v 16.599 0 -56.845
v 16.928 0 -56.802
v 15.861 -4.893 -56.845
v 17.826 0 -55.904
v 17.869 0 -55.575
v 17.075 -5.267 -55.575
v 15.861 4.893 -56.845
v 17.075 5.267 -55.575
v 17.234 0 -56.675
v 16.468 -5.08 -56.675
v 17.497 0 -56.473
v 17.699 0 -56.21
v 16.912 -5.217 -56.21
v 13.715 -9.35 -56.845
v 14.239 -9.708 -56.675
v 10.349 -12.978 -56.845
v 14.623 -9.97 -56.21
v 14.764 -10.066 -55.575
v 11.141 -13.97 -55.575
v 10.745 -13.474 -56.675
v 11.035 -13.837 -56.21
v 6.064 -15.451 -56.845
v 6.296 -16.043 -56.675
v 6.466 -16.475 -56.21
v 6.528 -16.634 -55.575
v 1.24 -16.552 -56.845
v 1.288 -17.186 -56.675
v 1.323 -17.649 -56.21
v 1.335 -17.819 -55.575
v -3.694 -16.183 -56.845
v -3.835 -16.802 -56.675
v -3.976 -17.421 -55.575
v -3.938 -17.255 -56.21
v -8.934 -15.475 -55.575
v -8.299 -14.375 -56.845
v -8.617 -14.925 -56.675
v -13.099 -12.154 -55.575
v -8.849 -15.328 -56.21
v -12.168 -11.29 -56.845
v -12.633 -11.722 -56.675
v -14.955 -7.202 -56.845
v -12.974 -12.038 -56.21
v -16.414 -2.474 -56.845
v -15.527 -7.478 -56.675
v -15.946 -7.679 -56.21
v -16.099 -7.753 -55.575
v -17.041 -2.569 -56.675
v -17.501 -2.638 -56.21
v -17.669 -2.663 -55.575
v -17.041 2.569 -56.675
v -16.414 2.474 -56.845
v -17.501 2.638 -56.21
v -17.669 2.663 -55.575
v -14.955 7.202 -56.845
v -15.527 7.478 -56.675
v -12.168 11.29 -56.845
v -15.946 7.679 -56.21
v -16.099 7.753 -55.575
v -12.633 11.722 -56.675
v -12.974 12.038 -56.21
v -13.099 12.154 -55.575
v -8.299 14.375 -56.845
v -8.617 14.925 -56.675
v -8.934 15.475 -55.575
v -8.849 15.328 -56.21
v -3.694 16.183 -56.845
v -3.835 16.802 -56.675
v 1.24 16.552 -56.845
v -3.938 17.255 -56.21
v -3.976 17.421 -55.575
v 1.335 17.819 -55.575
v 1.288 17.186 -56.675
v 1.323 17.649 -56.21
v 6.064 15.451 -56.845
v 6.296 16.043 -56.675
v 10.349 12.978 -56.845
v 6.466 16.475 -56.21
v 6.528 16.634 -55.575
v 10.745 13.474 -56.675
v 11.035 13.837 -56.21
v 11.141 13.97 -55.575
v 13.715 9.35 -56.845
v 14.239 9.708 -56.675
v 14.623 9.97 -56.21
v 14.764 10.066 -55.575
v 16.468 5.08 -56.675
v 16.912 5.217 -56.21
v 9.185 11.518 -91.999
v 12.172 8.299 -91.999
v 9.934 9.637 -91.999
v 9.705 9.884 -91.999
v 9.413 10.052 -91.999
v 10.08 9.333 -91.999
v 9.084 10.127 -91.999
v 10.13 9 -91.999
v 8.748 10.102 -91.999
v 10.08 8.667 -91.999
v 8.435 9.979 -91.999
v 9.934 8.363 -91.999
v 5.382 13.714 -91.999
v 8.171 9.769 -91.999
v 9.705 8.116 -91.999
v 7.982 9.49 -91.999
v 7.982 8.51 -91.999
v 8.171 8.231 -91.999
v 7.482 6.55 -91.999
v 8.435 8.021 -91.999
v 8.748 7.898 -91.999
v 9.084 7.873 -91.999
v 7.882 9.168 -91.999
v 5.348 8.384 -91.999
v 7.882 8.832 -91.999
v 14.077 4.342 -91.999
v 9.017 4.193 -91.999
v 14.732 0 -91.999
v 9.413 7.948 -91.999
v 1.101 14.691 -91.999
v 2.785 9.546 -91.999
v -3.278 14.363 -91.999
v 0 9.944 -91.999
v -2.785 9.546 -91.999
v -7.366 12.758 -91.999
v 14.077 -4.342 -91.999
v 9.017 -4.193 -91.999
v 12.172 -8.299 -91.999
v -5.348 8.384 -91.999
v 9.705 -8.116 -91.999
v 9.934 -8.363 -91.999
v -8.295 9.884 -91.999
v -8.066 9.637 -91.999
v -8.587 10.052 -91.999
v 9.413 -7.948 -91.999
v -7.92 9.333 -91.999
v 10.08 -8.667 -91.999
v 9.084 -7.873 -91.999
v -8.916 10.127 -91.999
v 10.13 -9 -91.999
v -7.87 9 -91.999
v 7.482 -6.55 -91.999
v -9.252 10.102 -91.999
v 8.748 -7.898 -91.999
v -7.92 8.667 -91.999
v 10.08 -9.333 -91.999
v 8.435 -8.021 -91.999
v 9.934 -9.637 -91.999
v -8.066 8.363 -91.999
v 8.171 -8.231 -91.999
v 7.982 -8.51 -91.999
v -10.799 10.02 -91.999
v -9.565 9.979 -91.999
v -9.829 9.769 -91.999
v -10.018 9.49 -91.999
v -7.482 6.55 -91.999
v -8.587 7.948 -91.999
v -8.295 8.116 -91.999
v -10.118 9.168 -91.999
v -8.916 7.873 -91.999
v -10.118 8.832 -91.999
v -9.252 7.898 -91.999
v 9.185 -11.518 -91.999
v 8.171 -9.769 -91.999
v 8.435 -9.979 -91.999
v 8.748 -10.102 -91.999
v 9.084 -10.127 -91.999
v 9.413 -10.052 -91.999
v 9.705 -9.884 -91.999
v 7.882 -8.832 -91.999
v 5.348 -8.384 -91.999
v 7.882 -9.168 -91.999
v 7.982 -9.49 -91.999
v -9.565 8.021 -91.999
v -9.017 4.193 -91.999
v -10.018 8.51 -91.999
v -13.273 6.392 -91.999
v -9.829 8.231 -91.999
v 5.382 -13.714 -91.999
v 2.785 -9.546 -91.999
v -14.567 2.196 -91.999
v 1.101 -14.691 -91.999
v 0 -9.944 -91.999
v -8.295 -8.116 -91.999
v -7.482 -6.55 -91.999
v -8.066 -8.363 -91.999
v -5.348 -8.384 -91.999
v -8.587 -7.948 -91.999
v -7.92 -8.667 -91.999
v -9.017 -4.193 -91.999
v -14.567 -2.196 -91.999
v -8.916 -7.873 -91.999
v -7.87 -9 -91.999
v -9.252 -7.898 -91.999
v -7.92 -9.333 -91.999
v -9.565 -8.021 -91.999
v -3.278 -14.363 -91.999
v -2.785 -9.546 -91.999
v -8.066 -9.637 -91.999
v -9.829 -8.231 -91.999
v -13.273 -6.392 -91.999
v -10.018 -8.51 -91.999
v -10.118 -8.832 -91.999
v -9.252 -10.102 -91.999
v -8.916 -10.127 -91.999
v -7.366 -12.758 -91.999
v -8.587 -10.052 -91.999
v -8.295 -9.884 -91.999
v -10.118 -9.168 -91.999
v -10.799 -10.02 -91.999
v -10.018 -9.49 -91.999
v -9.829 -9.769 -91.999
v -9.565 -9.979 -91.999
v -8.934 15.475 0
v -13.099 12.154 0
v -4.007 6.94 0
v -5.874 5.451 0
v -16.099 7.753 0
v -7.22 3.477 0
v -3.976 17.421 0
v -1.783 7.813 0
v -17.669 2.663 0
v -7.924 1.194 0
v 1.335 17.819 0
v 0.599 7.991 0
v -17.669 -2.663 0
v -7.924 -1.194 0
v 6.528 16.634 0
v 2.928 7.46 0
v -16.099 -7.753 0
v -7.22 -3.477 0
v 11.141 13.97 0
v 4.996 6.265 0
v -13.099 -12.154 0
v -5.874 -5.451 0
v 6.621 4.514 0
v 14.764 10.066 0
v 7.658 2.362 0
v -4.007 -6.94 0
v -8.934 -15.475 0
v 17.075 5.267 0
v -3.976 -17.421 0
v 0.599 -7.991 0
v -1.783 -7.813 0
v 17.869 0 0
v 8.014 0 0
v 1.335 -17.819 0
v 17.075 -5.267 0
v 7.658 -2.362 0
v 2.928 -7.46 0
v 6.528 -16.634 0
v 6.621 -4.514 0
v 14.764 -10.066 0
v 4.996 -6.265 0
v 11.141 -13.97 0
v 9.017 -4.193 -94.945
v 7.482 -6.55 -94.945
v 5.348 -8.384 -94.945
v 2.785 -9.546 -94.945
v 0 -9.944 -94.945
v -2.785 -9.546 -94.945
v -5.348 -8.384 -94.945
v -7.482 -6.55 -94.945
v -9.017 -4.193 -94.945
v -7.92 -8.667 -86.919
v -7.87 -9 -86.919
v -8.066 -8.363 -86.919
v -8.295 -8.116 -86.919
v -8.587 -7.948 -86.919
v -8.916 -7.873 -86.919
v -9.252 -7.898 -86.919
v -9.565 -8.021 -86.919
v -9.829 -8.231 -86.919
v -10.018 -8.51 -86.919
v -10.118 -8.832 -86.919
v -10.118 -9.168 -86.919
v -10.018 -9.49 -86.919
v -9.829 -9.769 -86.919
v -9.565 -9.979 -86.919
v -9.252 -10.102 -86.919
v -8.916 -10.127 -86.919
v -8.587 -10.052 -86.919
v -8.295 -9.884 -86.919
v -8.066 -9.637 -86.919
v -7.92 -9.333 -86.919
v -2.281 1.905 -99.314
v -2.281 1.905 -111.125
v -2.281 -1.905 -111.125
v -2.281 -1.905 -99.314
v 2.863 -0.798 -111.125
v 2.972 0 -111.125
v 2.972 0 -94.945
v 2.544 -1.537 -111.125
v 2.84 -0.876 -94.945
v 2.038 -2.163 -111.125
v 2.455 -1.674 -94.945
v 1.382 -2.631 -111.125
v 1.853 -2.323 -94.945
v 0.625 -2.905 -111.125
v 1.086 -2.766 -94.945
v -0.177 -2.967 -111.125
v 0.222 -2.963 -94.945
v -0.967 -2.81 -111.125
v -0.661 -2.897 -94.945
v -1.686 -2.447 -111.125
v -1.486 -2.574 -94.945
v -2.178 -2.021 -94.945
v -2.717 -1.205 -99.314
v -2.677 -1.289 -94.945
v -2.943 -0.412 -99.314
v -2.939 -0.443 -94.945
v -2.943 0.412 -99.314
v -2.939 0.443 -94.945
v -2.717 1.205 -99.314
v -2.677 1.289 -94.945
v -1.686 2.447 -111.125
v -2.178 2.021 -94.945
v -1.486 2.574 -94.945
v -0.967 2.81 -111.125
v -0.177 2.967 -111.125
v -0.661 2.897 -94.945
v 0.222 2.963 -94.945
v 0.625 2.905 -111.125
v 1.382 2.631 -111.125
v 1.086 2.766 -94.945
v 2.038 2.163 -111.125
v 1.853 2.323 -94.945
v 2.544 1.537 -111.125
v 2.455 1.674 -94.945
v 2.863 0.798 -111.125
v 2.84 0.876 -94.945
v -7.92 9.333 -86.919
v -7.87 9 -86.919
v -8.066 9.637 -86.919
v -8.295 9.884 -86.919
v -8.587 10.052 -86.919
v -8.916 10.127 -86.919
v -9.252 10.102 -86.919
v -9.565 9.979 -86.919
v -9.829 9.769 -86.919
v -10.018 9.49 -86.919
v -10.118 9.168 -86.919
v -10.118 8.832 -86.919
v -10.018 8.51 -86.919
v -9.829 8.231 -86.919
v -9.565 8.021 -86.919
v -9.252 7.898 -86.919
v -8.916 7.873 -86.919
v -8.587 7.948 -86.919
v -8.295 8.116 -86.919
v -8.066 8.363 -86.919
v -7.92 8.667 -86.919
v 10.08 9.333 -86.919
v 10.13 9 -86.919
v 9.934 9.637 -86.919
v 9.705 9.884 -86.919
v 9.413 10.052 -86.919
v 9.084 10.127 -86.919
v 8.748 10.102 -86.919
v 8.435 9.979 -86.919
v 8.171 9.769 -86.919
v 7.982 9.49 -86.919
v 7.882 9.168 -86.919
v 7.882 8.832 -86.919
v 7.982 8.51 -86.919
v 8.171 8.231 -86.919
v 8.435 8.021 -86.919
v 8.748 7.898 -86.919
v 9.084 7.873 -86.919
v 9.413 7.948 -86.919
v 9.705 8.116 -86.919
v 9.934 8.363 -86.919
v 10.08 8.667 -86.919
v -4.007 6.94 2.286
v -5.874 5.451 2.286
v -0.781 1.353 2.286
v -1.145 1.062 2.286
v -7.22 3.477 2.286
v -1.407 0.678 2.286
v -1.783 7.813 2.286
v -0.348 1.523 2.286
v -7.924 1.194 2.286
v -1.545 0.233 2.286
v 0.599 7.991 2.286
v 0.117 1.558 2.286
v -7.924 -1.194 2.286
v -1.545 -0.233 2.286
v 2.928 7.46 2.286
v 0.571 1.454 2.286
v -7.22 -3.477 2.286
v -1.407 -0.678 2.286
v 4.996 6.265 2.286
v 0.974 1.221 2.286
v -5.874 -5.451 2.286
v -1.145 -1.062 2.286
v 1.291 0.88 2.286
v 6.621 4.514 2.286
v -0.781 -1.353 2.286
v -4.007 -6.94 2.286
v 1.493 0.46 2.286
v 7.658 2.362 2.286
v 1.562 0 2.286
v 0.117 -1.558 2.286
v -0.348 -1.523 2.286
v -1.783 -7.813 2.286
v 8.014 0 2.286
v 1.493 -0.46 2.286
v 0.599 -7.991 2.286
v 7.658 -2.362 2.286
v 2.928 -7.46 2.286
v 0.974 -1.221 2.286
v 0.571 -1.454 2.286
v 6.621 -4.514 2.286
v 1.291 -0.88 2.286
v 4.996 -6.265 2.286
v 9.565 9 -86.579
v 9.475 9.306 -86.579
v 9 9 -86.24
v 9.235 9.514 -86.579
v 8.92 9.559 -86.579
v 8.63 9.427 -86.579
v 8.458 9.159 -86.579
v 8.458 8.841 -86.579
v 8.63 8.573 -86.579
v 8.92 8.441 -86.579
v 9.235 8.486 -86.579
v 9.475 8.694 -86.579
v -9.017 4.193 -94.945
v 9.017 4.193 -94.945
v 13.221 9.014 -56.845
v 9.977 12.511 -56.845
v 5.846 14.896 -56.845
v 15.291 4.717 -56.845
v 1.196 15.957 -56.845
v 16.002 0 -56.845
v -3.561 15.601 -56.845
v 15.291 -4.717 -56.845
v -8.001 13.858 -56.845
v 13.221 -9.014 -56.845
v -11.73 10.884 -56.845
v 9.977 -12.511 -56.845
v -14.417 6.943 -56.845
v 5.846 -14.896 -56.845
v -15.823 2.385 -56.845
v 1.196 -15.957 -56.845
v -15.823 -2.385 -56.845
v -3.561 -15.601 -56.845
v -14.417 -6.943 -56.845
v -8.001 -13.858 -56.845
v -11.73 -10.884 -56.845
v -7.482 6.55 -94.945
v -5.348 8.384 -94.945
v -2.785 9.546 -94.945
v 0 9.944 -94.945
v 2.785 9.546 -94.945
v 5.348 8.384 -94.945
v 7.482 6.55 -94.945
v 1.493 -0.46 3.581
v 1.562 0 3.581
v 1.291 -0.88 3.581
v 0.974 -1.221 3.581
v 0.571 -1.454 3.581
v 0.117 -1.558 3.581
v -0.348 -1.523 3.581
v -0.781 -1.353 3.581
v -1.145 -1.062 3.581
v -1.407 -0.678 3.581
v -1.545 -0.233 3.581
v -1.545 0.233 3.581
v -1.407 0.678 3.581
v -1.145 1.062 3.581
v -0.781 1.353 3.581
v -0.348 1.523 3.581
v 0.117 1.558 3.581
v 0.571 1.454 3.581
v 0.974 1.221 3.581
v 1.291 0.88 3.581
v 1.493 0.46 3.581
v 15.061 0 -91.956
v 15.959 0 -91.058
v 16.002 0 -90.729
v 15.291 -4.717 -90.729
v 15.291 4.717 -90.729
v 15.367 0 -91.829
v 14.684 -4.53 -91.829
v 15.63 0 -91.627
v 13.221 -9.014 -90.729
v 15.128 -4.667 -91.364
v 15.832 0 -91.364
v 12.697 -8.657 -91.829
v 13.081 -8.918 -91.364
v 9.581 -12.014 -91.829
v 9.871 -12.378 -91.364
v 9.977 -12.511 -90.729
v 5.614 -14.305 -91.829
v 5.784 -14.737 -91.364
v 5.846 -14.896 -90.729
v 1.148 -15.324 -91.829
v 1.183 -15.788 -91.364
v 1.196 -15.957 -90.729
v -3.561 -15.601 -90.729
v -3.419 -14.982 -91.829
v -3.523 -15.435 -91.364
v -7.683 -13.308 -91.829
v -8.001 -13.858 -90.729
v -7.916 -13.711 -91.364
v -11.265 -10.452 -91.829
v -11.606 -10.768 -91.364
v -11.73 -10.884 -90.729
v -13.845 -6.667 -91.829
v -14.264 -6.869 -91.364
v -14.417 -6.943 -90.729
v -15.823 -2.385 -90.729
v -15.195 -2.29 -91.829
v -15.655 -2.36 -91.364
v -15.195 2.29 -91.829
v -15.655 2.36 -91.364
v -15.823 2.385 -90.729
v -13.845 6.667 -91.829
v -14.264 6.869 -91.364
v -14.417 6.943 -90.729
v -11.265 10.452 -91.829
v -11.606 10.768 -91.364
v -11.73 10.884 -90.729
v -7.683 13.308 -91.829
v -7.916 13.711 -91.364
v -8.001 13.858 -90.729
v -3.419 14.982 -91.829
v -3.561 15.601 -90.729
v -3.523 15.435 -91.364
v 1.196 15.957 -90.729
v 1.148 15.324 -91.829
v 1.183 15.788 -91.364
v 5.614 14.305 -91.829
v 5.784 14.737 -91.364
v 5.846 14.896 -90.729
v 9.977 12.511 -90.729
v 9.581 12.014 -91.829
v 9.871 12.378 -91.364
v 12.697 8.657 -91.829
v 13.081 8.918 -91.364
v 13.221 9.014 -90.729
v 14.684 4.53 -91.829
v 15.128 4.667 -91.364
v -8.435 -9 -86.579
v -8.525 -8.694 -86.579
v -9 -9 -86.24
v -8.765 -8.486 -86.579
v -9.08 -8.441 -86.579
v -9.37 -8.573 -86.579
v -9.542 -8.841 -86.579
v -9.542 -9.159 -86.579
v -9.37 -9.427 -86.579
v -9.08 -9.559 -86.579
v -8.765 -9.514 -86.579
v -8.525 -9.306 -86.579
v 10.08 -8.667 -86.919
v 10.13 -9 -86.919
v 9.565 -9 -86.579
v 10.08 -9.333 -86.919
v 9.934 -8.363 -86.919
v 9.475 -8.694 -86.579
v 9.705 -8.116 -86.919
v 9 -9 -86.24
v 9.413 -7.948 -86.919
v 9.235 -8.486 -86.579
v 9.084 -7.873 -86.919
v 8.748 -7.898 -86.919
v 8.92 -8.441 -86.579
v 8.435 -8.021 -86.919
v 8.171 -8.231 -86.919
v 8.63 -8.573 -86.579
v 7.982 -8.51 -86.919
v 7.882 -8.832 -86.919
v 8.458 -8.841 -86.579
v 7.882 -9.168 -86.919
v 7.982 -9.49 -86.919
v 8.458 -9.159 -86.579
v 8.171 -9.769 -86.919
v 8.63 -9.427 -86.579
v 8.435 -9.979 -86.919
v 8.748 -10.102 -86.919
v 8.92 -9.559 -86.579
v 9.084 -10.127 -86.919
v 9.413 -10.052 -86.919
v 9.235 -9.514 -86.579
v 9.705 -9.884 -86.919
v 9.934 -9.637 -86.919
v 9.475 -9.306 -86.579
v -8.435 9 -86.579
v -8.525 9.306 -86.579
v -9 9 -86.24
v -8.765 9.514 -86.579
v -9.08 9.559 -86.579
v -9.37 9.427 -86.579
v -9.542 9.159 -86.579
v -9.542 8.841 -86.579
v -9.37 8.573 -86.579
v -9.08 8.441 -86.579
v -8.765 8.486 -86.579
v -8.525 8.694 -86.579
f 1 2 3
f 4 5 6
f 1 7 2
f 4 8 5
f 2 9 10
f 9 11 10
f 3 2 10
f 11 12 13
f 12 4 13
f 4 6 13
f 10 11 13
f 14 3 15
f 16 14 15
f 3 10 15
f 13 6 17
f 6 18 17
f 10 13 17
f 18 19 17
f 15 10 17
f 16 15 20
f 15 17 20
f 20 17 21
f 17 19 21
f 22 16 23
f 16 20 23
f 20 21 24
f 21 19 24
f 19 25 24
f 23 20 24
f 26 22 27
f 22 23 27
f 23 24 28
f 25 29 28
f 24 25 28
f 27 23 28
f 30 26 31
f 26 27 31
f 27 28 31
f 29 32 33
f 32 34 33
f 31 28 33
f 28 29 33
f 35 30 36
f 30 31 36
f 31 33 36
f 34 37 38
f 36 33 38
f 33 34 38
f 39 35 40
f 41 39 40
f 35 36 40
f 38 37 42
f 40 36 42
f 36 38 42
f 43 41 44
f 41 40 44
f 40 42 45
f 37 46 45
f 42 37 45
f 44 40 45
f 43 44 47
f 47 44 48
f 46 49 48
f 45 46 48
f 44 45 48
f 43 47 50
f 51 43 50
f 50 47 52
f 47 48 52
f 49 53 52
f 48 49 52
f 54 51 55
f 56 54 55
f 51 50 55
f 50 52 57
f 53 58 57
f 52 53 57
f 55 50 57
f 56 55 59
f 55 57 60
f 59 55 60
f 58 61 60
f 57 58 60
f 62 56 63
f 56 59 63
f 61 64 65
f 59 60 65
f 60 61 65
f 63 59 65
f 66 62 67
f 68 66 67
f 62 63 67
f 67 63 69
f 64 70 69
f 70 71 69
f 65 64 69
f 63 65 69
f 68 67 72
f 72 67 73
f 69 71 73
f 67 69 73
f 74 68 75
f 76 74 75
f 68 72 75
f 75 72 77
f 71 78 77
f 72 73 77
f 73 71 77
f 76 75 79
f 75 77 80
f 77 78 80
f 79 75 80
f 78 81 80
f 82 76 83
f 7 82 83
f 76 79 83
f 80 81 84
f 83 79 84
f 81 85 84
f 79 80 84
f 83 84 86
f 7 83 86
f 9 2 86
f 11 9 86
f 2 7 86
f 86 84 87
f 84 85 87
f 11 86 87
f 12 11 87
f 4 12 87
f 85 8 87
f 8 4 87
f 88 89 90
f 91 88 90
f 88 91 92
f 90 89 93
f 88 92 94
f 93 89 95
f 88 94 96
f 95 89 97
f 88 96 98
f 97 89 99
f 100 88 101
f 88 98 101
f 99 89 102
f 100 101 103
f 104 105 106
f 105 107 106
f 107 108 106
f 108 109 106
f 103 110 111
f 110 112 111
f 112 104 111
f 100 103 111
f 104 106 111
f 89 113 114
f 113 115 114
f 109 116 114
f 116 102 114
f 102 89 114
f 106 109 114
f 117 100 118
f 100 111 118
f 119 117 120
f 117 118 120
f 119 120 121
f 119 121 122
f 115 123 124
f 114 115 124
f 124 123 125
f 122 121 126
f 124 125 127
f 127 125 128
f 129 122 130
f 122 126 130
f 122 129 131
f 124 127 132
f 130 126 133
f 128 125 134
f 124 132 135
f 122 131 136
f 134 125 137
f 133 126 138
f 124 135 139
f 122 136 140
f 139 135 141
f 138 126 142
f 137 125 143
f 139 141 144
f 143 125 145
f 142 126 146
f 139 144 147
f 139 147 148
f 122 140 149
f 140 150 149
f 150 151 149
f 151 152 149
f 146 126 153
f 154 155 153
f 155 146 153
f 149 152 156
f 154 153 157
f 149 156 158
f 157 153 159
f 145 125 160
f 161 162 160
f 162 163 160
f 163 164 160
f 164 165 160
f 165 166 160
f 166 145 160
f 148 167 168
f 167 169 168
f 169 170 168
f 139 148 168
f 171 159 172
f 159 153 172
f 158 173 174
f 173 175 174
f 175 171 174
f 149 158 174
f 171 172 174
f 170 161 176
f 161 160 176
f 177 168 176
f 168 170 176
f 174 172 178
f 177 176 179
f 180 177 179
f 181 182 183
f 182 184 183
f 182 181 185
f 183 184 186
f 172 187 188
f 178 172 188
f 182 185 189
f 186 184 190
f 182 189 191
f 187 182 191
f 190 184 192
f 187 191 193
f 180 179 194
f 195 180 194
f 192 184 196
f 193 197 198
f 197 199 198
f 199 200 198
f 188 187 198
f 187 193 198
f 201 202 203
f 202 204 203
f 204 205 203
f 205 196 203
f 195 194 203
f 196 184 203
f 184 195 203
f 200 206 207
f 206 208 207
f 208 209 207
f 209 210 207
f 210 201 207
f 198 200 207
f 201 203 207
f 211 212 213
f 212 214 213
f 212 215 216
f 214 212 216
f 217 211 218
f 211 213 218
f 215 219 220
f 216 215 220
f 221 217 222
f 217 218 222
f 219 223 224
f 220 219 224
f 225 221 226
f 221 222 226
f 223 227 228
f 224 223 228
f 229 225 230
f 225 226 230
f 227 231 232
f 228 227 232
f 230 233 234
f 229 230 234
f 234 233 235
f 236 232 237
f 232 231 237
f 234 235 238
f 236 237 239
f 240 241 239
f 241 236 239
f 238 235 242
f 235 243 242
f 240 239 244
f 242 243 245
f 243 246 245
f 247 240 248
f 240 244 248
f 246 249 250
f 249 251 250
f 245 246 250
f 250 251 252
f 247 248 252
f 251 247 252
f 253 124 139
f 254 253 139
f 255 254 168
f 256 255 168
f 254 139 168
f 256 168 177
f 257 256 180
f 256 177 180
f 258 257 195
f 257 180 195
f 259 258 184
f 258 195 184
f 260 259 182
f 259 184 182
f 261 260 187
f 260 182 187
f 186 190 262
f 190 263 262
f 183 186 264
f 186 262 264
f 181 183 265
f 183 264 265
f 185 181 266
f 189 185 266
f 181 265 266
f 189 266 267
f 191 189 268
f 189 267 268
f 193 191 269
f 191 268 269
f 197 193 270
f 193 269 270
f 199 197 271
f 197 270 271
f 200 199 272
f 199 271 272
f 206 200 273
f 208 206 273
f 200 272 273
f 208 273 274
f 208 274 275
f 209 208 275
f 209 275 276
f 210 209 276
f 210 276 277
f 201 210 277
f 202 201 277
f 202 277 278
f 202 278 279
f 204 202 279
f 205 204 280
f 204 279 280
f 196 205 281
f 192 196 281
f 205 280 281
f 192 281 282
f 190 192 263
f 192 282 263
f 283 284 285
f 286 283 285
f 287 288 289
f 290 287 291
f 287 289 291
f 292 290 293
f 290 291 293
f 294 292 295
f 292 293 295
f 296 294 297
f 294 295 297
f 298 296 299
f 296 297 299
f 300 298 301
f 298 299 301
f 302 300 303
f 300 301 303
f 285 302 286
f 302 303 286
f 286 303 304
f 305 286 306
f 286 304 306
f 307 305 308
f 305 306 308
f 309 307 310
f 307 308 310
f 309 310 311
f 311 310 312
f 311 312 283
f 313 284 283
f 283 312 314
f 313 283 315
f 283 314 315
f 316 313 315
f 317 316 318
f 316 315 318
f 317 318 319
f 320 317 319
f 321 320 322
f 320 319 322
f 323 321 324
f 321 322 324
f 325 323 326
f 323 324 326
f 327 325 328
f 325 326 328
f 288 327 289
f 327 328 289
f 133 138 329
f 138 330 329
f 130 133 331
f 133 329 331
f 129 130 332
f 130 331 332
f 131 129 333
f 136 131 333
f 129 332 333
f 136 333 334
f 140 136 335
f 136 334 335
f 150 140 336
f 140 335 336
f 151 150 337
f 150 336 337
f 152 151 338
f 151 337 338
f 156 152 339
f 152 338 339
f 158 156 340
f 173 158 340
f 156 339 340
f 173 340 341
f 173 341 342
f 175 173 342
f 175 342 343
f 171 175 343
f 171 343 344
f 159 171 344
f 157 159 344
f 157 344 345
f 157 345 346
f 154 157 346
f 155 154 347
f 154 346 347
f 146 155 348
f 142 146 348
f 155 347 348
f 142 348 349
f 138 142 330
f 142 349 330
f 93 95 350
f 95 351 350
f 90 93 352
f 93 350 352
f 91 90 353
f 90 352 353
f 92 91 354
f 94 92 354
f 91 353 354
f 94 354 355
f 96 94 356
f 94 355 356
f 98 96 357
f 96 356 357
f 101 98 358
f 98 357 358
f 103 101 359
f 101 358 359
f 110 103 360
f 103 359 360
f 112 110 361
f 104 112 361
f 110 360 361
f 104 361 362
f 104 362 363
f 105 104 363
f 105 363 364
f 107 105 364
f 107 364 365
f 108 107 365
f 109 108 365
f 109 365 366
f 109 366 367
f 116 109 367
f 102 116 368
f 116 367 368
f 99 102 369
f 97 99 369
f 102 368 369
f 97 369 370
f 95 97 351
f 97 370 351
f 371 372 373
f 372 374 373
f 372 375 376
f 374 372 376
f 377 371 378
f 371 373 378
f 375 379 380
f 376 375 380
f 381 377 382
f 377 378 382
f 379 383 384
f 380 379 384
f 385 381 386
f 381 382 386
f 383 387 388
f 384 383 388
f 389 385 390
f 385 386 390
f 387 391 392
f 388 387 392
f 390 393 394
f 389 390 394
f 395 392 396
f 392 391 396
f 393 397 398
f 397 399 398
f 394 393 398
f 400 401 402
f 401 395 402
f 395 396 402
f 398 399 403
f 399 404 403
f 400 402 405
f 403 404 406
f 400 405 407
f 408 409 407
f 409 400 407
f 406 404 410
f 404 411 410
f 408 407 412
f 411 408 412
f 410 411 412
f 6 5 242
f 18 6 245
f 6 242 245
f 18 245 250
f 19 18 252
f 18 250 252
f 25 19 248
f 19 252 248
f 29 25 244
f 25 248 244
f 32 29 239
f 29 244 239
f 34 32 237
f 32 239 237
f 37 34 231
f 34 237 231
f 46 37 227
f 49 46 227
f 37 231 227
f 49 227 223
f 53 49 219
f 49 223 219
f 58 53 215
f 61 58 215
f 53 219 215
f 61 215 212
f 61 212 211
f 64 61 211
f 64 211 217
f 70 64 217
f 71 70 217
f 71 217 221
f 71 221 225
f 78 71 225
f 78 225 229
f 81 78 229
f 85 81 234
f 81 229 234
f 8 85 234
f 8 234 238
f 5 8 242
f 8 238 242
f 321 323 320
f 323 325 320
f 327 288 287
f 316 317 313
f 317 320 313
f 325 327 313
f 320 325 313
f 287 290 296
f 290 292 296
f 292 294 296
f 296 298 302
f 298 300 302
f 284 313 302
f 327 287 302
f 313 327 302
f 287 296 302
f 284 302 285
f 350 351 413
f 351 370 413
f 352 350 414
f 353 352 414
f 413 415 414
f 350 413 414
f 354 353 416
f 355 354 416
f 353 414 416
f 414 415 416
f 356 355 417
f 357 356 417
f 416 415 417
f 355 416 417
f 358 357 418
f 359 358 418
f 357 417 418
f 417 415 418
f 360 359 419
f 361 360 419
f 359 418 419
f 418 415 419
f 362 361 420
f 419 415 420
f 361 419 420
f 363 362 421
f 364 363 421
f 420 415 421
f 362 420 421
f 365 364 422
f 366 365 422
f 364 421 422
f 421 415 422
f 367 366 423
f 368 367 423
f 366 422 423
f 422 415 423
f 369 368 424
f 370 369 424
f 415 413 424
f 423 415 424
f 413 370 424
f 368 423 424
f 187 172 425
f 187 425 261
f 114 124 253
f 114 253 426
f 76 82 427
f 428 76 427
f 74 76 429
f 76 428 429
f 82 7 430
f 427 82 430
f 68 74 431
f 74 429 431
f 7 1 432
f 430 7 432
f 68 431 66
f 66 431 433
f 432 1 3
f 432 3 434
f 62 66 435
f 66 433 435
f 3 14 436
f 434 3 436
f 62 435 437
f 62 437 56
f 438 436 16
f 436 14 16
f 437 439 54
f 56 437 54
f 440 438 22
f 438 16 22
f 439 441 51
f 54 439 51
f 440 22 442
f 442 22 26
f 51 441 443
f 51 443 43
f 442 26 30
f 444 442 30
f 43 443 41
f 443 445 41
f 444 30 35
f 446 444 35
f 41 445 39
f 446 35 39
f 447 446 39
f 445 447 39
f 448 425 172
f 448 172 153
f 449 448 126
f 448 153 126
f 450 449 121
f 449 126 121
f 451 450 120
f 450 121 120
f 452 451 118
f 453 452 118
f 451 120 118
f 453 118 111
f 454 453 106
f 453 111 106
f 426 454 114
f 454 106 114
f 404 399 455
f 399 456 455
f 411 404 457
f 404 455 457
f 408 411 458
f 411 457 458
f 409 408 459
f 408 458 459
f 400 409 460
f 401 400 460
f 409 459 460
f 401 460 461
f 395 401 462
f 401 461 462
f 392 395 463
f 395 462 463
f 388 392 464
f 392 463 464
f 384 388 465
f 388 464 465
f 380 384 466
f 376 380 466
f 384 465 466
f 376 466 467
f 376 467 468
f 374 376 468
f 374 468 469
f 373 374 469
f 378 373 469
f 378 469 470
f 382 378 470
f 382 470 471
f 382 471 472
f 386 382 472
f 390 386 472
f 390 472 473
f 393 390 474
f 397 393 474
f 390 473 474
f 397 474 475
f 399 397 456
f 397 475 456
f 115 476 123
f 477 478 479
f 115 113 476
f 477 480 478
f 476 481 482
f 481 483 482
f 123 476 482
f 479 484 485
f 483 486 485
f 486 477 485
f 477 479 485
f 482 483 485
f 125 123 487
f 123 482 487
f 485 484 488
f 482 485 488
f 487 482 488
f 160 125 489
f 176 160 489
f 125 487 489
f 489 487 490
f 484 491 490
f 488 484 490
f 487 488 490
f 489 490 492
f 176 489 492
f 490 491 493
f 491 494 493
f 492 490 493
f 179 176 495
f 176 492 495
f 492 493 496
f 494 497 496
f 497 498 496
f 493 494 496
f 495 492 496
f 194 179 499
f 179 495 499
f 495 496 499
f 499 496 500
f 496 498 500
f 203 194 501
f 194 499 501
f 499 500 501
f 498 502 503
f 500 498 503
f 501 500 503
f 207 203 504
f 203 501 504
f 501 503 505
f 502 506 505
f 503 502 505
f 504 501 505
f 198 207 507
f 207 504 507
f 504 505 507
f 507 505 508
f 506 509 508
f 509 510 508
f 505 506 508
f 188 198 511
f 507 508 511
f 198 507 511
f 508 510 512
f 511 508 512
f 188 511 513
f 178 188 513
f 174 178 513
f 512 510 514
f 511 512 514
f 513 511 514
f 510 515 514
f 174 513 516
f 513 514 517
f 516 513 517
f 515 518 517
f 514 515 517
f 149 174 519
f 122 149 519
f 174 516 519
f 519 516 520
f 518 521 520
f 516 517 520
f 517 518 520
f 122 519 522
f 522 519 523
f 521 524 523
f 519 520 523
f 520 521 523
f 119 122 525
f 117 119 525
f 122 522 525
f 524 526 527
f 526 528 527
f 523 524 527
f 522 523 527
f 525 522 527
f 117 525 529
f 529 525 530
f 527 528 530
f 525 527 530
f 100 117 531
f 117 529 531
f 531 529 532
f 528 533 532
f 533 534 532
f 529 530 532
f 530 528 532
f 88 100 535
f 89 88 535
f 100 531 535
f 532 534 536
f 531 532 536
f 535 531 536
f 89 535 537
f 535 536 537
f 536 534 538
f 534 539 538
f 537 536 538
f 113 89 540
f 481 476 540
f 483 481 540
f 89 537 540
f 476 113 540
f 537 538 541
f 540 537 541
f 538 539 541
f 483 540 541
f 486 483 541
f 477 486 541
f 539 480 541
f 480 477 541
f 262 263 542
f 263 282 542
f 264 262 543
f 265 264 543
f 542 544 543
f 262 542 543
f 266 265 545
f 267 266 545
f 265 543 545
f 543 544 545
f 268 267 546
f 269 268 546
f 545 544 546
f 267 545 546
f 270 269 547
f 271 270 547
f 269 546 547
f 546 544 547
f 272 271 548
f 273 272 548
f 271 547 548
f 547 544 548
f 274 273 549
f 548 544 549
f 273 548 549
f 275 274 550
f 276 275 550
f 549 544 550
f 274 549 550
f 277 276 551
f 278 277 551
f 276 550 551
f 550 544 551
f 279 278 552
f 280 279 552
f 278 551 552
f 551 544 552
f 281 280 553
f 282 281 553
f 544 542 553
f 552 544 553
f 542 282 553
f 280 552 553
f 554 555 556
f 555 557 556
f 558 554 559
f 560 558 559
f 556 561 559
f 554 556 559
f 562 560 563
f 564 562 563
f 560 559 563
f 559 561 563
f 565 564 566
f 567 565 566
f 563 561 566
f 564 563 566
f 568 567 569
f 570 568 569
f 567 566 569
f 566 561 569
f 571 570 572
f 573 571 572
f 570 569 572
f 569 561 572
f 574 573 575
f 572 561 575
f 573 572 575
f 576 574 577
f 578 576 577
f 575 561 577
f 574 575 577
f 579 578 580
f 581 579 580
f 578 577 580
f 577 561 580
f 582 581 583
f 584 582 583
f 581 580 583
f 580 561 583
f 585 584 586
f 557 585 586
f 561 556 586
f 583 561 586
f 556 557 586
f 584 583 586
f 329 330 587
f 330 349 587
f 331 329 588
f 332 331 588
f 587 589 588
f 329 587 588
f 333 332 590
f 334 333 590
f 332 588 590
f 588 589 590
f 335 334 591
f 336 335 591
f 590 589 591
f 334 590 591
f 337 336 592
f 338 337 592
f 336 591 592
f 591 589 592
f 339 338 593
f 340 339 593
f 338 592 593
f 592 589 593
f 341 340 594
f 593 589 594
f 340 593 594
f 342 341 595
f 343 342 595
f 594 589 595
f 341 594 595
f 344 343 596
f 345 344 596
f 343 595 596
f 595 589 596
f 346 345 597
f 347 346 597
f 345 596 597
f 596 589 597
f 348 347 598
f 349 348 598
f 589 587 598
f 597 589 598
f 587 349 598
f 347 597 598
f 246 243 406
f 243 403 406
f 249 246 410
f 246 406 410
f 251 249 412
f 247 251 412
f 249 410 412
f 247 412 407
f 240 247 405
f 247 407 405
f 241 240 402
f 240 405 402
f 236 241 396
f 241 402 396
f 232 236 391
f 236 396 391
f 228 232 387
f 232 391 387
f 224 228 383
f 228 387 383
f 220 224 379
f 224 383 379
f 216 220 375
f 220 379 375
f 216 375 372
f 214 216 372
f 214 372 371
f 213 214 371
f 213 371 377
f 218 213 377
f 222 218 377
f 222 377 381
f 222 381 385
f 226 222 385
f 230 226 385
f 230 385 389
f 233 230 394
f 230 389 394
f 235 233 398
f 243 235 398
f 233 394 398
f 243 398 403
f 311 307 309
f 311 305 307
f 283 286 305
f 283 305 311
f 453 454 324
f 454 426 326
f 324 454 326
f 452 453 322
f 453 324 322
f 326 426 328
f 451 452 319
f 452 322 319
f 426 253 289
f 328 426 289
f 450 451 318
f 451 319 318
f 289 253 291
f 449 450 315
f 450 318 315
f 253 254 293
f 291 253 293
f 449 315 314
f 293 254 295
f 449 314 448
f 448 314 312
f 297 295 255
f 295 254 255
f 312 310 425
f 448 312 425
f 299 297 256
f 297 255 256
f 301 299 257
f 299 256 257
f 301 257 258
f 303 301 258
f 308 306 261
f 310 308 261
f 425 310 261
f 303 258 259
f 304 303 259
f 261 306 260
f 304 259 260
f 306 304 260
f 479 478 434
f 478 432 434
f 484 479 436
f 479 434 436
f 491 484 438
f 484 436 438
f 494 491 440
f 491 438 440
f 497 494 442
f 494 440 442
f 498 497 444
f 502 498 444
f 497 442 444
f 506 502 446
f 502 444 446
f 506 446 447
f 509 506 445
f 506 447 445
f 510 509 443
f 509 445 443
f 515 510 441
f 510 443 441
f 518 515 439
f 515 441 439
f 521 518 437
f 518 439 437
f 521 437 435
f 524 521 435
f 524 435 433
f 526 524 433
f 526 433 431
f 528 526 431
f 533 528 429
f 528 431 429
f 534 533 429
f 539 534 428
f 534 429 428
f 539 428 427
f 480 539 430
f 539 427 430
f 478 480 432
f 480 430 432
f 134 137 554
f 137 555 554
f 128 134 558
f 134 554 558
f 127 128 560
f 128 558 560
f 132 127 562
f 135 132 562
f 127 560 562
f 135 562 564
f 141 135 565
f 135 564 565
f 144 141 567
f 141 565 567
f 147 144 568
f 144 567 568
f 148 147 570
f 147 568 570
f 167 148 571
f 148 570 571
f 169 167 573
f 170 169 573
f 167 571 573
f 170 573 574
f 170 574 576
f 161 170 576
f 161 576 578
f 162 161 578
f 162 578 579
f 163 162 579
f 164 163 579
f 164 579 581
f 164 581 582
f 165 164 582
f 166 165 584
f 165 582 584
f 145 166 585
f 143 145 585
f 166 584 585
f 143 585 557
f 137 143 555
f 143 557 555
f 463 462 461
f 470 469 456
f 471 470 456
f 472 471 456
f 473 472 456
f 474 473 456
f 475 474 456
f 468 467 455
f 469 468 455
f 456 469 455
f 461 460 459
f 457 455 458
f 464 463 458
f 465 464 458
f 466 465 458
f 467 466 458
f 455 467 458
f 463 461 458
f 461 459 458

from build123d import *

# Parameters (mm, degrees)
CUT_EXTRUDE1_START = -2.9464
CUT_EXTRUDE1_DEPTH = 2.9464
CUT_EXTRUDE2_DEPTH = 11.811


# Read off the part's stored shape, not the designer's step: #4-40 Tapped Hole1
with BuildPart() as part:
    # Sketch1 → Revolve1 (revolve)
    with BuildSketch(Plane(origin=(0, 0, 0), x_dir=(0, 0, -1), z_dir=(1, 0, 0)), mode=Mode.PRIVATE) as revolve1_sk:
        with BuildLine():
            Line((111.125, 0), (111.125, 2.9718))
            Line((111.125, 2.9718), (94.9452, 2.9718))
            Line((94.9452, 2.9718), (94.9452, 9.9441))
            Line((94.9452, 9.9441), (91.9988, 9.9441))
            Line((91.9988, 9.9441), (91.9988, 14.732))
            ThreePointArc((91.9988, 14.732), (91.626825612, 15.630025612), (90.7288, 16.002))
            Line((90.7288, 16.002), (56.8452, 16.002))
            Line((56.8452, 16.002), (56.8452, 16.5989))
            ThreePointArc((56.8452, 16.5989), (56.473225612, 17.496925612), (55.5752, 17.8689))
            Line((55.5752, 17.8689), (0, 17.8689))
            Line((0, 17.8689), (0, 8.0137))
            Line((0, 8.0137), (-2.286, 8.0137))
            Line((-2.286, 8.0137), (-2.286, 1.5621))
            Line((-2.286, 1.5621), (-3.5814, 1.5621))
            Line((-3.5814, 1.5621), (-3.5814, 0))
            Line((-3.5814, 0), (111.125, 0))
        make_face()
    revolve(revolve1_sk.sketch.rotate(Axis((0, 0, 3.5814), (0, 0, -1)), 90), axis=Axis((0, 0, 3.5814), (0, 0, -1)))

    # #4-40 Tapped Hole1 outline → #4-40 Tapped Hole1 (revolve, cut)
    with BuildSketch(Plane(origin=(-9, -9, 0), x_dir=(1, 0, 0), z_dir=(0, -1, 0))):
        Polygon((1.1303, -86.9188), (0, -86.239647242), (0, -91.9988), (1.1303, -91.9988), align=None)
    revolve(axis=Axis((-9, -9, 0), (0, 0, 1)), mode=Mode.SUBTRACT)

    # 4-40 Tapped Hole1 2 outline → 4-40 Tapped Hole1 2 (revolve, cut)
    with BuildSketch(Plane(origin=(9, 9, 0), x_dir=(1, 0, 0), z_dir=(0, -1, 0))):
        Polygon((1.1303, -86.9188), (0, -86.239647242), (0, -91.9988), (1.1303, -91.9988), align=None)
    revolve(axis=Axis((9, 9, 0), (0, 0, 1)), mode=Mode.SUBTRACT)

    # 4-40 Tapped Hole1 3 outline → 4-40 Tapped Hole1 3 (revolve, cut)
    with BuildSketch(Plane(origin=(9, -9, 0), x_dir=(1, 0, 0), z_dir=(0, -1, 0))):
        Polygon((1.1303, -86.9188), (0, -86.239647242), (0, -91.9988), (1.1303, -91.9988), align=None)
    revolve(axis=Axis((9, -9, 0), (0, 0, 1)), mode=Mode.SUBTRACT)

    # 4-40 Tapped Hole1 4 outline → 4-40 Tapped Hole1 4 (revolve, cut)
    with BuildSketch(Plane(origin=(-9, 9, 0), x_dir=(1, 0, 0), z_dir=(0, -1, 0))):
        Polygon((1.1303, -86.9188), (0, -86.239647242), (0, -91.9988), (1.1303, -91.9988), align=None)
    revolve(axis=Axis((-9, 9, 0), (0, 0, 1)), mode=Mode.SUBTRACT)

    # Sketch5 → Cut-Extrude1 (cut)
    with BuildSketch(Plane(origin=(0, 0, -94.9452), x_dir=(-1, 0, 0), z_dir=(0, 0, -1)).offset(CUT_EXTRUDE1_START)):
        with BuildLine():
            Line((-9.017, -4.192712226), (-9.017, 4.192712226))
            ThreePointArc((-9.017, 4.192712226), (-9.9441, 0), (-9.017, -4.192712226))
        make_face()
        with BuildLine():
            ThreePointArc((9.9441, 0), (9.709559066, 2.146995006), (9.017, 4.192712226))
            Line((9.017, 4.192712226), (9.017, -4.192712226))
            ThreePointArc((9.017, -4.192712226), (9.709559066, -2.146995006), (9.9441, 0))
        make_face()
    extrude(amount=CUT_EXTRUDE1_DEPTH, mode=Mode.SUBTRACT)

    # Sketch6 → Cut-Extrude2 (cut)
    with BuildSketch(Plane(origin=(0, 0, -111.125), x_dir=(-1, 0, 0), z_dir=(0, 0, -1))):
        Polygon((2.280914343, 68.368161202), (2.280914343, 1.905), (2.280914343, -1.905), (2.280914343, -68.368161202), (135.207236746, -68.368161202), (135.207236746, 68.368161202), align=None)
    extrude(amount=-CUT_EXTRUDE2_DEPTH, mode=Mode.SUBTRACT)


solid = part.part
